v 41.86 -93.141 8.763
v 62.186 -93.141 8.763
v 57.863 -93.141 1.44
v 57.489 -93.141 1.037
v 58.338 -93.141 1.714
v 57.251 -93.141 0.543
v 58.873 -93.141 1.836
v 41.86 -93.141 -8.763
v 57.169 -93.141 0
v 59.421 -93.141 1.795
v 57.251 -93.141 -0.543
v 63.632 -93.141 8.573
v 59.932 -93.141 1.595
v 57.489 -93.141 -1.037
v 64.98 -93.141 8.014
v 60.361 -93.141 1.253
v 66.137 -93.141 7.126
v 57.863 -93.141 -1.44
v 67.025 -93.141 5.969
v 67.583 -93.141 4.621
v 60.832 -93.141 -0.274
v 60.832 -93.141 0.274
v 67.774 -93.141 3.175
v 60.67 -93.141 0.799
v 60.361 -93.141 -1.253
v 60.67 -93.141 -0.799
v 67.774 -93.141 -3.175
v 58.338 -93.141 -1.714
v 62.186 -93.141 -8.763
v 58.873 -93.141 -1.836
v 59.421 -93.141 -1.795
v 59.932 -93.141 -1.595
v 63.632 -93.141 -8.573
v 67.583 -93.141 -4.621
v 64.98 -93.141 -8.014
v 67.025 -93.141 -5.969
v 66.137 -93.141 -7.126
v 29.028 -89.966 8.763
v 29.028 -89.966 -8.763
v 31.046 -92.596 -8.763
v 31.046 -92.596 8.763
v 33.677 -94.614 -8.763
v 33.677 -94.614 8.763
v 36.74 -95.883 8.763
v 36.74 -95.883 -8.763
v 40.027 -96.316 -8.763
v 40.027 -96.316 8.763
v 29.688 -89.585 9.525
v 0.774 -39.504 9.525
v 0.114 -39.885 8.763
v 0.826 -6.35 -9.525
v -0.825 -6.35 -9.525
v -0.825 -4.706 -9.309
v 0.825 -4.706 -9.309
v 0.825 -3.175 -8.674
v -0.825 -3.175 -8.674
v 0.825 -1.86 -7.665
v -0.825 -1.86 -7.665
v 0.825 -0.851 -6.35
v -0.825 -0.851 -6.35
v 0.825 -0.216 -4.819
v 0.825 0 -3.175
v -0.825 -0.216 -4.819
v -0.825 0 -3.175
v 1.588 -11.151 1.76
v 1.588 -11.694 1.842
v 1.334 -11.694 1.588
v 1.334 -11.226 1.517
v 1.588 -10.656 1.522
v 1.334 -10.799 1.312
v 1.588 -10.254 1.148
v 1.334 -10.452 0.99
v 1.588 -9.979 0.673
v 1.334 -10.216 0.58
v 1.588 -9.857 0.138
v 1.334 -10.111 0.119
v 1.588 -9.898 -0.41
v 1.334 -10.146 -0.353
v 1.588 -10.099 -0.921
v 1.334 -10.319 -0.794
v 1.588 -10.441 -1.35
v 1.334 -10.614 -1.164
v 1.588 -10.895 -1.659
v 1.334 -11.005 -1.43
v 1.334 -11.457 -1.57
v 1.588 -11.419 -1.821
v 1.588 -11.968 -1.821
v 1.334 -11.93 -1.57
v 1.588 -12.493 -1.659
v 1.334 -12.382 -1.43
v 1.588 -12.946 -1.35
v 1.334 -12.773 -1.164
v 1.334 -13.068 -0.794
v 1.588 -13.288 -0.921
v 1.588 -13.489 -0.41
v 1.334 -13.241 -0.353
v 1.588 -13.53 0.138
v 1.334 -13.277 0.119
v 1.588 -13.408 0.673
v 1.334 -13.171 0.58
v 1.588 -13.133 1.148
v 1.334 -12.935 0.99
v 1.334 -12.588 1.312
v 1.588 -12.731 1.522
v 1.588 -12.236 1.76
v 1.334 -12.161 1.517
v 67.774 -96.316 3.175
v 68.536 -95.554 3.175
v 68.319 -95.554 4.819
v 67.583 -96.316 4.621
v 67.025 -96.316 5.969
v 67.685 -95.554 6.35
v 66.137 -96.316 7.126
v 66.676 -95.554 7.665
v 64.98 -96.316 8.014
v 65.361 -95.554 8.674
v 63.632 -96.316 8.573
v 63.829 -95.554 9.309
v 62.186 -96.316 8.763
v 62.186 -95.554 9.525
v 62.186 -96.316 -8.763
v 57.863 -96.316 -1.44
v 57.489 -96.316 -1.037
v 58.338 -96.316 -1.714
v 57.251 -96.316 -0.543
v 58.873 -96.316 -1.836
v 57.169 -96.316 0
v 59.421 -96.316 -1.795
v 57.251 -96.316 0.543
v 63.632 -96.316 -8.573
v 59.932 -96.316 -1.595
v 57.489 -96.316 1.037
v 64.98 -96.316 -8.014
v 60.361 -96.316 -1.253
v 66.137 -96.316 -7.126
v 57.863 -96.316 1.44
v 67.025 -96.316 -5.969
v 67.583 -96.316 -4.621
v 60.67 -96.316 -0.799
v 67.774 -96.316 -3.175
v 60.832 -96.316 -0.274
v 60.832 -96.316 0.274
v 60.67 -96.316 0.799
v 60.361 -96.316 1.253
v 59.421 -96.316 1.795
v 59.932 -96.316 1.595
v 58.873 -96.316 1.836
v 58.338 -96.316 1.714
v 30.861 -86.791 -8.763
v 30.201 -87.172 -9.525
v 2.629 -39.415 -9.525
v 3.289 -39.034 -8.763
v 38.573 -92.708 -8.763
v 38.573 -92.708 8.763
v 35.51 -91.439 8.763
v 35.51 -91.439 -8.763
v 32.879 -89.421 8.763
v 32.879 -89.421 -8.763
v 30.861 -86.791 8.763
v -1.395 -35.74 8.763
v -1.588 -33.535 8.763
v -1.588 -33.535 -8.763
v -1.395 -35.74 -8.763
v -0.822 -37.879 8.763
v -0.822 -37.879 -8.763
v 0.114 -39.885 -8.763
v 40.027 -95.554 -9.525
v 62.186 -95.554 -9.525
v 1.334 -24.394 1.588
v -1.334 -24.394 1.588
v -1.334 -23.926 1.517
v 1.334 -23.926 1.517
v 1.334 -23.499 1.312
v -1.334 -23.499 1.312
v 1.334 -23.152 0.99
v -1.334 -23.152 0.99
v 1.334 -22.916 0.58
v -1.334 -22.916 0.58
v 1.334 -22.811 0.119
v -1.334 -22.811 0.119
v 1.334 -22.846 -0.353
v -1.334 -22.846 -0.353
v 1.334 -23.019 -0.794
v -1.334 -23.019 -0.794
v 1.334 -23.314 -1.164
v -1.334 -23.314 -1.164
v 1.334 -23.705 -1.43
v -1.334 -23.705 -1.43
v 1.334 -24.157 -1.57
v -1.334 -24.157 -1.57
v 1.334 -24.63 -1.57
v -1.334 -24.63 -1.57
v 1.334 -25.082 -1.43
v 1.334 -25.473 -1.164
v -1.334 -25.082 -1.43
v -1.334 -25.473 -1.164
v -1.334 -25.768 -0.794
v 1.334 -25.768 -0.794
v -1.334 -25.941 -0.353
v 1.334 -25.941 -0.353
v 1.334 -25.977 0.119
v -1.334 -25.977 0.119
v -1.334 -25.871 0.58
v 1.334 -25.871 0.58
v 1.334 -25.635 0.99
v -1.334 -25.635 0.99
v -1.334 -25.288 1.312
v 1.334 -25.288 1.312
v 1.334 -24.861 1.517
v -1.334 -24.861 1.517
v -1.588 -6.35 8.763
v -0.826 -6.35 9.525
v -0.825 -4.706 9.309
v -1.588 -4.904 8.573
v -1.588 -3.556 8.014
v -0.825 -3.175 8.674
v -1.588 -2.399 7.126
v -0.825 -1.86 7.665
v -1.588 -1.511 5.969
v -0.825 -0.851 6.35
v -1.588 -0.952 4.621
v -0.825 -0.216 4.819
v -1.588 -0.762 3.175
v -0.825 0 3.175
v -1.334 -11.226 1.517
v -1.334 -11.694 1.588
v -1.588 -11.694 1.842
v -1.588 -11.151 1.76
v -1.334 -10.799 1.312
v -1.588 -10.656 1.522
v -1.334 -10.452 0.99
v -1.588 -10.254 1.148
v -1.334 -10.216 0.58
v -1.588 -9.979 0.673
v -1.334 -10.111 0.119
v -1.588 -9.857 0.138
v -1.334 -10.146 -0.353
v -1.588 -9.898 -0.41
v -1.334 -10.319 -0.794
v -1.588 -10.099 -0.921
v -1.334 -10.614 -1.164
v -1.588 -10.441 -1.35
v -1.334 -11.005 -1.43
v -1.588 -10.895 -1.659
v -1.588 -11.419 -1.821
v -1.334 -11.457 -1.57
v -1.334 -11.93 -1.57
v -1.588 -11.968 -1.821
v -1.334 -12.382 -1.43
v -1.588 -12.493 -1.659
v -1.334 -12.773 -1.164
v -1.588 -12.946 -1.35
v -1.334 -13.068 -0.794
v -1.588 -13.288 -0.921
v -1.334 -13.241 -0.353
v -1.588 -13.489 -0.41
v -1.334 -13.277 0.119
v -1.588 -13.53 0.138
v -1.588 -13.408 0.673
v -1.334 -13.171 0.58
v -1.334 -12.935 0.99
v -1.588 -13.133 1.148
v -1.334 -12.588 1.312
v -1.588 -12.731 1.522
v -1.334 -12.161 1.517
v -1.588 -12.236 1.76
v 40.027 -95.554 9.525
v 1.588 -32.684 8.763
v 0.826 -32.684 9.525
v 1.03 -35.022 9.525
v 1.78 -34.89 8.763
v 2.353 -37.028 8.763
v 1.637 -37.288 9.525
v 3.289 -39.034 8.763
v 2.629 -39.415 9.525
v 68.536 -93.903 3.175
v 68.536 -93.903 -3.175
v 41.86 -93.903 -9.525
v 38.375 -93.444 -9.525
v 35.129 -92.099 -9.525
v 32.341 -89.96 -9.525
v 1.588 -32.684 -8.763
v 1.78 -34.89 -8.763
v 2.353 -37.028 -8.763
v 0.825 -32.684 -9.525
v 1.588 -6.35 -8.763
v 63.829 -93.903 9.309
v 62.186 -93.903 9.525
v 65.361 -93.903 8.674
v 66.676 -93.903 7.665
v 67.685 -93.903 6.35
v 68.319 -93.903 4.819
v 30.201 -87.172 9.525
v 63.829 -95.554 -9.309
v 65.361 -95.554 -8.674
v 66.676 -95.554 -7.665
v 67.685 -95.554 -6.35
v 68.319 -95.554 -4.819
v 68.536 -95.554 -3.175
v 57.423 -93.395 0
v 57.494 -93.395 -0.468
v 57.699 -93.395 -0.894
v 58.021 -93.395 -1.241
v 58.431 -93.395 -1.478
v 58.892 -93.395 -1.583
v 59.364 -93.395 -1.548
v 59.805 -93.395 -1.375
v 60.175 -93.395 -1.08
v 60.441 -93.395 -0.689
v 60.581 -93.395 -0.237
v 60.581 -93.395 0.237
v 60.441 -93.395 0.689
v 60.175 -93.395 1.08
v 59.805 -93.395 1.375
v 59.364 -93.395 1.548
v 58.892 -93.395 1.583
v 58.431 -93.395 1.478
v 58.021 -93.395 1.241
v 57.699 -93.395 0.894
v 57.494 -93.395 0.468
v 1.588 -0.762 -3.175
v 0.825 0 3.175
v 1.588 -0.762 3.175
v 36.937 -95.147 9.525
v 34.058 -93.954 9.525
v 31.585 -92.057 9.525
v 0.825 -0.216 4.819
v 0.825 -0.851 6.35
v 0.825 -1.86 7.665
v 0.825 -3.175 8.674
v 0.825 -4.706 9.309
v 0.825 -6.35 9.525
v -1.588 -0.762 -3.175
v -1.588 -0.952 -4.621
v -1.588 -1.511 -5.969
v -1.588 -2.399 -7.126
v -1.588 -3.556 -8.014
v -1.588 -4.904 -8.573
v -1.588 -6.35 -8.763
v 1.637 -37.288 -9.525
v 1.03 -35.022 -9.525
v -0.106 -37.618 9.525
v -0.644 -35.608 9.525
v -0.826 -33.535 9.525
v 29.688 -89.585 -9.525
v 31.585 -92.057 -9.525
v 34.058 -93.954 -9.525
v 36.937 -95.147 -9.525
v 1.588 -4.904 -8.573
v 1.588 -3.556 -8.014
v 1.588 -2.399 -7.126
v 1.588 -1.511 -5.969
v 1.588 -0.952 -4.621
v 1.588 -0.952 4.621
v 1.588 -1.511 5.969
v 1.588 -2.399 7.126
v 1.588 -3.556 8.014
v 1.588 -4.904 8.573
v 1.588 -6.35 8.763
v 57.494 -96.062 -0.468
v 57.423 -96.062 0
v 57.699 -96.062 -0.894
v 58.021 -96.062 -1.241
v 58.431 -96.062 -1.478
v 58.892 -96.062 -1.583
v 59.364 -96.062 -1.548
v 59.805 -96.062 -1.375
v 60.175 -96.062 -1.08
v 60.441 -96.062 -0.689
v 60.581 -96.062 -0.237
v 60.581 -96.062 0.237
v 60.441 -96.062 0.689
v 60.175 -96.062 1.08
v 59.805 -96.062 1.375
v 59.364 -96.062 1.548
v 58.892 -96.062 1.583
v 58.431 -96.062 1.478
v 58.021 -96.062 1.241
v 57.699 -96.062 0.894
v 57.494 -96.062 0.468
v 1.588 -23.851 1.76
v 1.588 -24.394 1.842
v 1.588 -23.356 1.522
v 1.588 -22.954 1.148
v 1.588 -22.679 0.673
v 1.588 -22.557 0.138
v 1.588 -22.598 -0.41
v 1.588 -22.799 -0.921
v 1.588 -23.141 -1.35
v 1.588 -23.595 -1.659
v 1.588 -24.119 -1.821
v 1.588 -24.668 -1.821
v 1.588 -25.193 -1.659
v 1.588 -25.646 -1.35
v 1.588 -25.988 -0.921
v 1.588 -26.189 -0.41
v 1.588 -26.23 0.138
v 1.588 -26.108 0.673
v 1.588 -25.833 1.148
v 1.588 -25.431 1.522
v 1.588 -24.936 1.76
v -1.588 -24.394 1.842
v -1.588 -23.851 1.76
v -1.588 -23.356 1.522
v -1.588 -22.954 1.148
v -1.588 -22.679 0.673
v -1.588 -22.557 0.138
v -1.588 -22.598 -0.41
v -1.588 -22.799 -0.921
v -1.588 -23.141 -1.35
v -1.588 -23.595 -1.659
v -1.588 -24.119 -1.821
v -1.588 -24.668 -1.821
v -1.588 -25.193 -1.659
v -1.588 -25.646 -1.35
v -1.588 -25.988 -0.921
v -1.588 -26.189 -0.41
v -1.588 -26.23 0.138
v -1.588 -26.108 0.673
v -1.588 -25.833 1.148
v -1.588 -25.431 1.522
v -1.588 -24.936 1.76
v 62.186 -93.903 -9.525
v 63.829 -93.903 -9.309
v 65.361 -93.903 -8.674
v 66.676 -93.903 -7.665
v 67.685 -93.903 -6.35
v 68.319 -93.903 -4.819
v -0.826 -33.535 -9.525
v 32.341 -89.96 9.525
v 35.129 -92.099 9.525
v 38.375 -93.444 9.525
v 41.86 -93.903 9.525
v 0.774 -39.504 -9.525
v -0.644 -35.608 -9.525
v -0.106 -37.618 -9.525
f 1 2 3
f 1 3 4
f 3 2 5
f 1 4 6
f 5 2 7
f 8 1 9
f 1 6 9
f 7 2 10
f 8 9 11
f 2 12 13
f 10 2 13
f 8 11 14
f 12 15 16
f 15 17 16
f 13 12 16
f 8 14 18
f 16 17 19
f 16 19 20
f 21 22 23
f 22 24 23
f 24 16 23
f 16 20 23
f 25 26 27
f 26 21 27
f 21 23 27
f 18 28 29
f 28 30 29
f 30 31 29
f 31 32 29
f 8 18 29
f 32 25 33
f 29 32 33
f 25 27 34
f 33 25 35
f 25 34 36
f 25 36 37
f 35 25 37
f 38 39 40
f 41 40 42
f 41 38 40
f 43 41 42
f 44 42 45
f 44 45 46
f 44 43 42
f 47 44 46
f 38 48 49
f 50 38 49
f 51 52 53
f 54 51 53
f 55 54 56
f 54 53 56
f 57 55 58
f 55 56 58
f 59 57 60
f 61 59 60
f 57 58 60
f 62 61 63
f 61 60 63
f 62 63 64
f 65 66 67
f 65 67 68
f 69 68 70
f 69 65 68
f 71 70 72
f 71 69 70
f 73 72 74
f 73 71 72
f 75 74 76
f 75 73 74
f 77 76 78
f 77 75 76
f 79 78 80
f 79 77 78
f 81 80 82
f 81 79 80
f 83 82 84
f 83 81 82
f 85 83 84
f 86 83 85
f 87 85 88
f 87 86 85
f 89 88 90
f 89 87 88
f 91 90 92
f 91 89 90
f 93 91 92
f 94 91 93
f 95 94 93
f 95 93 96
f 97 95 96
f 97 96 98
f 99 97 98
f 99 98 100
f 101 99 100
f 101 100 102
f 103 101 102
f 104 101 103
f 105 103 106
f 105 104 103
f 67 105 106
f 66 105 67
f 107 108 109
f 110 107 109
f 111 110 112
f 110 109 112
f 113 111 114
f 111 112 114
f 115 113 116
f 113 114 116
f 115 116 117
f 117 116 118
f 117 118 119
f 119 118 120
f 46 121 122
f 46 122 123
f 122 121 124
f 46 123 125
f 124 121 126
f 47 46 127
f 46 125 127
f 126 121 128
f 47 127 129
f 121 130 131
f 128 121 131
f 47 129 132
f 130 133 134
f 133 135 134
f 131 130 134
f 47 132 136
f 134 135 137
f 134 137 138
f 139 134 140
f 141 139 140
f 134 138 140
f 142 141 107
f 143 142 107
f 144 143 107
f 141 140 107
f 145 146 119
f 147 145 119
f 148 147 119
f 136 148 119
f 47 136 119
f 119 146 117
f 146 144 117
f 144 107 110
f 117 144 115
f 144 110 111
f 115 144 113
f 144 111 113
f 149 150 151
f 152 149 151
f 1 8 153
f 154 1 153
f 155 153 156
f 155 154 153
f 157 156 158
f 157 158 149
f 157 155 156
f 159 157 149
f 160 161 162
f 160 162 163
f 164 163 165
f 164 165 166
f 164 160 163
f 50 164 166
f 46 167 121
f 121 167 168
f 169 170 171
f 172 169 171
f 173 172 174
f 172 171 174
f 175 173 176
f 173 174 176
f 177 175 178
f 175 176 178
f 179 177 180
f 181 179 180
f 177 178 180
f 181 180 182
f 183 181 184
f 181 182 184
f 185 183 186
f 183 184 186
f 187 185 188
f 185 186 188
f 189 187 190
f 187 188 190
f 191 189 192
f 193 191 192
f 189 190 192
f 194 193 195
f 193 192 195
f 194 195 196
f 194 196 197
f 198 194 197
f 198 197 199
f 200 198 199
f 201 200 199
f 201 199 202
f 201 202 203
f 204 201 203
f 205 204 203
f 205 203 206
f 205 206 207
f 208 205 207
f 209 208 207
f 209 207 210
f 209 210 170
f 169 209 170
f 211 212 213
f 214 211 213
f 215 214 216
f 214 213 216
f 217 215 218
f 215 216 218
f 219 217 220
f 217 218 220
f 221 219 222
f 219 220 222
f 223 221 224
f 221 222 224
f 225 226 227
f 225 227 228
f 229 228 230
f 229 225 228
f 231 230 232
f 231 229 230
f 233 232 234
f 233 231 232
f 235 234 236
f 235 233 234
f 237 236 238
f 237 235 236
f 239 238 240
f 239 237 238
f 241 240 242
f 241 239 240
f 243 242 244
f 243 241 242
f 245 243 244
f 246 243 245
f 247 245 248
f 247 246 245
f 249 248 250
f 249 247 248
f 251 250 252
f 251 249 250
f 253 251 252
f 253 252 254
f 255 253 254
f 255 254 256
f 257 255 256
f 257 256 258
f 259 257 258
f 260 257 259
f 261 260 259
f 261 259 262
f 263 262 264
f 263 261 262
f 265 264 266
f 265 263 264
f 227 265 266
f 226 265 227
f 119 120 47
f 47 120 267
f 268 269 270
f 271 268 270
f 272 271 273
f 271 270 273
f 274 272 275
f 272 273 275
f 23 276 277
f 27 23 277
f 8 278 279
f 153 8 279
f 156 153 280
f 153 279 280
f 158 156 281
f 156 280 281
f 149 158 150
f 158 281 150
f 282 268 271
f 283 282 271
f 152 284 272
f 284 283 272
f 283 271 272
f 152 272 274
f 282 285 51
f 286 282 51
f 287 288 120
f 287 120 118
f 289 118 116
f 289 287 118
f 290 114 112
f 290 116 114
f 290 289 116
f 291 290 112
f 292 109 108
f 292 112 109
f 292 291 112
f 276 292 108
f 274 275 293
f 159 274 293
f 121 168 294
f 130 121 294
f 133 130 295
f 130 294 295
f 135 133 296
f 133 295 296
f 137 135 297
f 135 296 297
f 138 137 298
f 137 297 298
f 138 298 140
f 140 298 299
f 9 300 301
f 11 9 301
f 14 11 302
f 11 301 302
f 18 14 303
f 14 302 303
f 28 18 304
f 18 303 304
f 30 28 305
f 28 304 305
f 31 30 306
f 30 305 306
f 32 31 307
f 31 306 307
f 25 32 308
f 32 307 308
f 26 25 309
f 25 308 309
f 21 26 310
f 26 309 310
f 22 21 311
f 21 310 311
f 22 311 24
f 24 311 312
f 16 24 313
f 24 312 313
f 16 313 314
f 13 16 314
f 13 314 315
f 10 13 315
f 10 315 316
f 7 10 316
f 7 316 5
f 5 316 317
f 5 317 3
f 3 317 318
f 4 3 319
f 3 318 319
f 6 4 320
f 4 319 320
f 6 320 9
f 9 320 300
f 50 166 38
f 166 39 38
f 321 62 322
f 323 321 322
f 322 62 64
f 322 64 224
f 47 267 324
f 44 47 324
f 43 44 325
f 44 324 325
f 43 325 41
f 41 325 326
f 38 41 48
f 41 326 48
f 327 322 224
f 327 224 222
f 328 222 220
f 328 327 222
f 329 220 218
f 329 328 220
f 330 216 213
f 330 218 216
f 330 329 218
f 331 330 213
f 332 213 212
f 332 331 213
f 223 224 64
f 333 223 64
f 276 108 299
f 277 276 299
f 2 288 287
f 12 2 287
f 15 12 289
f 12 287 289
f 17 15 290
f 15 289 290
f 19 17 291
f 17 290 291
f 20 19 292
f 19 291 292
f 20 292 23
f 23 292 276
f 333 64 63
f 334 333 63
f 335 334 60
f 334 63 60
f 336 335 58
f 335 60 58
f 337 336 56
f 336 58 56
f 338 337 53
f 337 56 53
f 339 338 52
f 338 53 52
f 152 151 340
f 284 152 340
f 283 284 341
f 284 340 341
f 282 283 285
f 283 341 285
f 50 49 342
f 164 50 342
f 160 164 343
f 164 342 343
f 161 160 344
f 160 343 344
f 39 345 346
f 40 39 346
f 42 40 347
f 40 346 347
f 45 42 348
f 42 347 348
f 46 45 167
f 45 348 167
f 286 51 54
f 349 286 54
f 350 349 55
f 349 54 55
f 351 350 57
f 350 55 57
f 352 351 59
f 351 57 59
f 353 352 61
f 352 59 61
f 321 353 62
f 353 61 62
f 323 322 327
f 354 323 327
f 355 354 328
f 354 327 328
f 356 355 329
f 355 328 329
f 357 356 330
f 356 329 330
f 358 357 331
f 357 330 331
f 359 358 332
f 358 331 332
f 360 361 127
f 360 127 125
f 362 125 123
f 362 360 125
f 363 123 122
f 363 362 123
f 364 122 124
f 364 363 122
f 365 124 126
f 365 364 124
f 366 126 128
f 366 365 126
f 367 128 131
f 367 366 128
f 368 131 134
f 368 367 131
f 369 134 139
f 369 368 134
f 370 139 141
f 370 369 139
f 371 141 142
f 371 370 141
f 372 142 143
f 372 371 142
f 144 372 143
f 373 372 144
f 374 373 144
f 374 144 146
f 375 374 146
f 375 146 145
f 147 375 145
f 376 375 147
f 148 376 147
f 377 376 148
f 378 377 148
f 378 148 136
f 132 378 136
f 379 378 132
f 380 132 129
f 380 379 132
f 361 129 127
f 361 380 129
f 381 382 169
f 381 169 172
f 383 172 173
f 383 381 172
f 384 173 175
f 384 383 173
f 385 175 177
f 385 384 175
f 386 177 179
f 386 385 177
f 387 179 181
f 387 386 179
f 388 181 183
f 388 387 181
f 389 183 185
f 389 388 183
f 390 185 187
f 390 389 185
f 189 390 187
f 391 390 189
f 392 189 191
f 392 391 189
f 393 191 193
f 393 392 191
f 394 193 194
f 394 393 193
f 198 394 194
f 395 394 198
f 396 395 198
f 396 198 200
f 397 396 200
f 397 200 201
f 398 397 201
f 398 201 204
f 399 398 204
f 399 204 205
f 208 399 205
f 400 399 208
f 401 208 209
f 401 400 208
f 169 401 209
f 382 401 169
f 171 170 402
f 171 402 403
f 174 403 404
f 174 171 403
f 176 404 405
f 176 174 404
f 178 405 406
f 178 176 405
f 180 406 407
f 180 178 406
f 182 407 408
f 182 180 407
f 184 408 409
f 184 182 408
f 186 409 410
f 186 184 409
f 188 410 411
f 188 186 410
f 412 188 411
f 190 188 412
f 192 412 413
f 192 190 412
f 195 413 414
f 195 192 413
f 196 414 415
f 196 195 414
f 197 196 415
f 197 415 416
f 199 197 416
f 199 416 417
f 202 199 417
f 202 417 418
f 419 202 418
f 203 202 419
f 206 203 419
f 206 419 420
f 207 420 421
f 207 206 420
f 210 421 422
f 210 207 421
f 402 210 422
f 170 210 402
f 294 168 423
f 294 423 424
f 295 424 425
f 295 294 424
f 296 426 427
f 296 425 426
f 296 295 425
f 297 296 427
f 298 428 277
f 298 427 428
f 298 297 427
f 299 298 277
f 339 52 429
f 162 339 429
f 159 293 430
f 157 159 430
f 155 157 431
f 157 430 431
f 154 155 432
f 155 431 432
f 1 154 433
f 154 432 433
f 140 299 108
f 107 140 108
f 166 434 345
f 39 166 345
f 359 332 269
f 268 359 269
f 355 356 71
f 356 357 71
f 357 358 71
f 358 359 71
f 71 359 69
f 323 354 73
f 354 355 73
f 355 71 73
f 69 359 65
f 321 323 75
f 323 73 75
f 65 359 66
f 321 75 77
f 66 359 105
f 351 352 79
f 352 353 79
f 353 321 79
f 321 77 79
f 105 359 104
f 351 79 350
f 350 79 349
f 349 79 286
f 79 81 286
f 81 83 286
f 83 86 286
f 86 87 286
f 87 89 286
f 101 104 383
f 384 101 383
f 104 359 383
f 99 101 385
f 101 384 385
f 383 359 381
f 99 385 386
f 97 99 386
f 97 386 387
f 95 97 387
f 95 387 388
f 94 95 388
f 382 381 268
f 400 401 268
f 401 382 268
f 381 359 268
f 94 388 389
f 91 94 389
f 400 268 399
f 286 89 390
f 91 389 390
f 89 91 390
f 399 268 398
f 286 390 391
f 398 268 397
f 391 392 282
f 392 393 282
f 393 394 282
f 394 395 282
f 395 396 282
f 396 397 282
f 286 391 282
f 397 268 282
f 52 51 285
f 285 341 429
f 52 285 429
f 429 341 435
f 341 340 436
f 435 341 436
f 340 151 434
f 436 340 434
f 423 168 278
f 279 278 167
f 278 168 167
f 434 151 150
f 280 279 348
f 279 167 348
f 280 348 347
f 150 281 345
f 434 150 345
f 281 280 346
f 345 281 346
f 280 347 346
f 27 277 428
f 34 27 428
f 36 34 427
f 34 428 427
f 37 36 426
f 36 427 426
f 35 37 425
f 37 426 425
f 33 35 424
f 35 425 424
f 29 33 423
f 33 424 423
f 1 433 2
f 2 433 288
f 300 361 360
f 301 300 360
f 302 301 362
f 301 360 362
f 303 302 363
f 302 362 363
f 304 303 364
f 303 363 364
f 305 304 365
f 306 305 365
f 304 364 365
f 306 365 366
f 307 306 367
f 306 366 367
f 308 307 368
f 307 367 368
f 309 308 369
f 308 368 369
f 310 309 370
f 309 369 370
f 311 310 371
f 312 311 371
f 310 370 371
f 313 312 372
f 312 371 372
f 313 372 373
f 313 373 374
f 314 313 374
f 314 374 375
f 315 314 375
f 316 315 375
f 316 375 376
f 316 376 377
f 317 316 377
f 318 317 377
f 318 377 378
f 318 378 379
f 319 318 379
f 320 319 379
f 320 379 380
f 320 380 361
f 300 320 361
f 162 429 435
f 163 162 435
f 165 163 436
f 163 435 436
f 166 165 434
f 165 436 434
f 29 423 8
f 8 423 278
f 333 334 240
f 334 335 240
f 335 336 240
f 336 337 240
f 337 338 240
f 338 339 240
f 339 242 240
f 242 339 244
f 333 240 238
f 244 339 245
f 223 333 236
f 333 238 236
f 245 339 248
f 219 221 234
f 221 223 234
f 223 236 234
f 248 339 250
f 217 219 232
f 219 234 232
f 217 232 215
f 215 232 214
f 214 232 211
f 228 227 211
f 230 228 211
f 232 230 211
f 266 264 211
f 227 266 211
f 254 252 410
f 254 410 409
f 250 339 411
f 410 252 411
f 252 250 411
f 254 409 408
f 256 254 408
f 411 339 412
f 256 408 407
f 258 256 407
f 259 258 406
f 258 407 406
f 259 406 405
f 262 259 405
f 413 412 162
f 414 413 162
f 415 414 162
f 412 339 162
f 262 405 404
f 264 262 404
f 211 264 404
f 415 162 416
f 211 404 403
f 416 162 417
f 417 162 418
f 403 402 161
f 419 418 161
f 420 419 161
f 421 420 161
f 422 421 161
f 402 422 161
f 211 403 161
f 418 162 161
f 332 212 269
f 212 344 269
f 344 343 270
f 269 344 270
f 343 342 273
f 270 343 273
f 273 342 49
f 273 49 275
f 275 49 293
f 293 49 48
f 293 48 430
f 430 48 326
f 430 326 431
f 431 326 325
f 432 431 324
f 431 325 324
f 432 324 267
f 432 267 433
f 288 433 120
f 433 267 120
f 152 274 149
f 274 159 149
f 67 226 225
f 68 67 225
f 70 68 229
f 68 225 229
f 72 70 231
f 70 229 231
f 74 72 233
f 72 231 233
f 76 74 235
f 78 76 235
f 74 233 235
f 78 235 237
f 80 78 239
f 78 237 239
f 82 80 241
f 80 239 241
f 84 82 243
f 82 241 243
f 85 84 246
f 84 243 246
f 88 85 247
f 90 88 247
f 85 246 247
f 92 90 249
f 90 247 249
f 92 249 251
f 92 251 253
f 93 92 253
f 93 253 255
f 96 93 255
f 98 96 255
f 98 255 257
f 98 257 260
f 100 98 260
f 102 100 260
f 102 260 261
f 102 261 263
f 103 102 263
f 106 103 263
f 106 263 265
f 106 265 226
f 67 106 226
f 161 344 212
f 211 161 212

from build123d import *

# Parameters (mm, degrees)
SKETCH2_W                    = 3.175
SKETCH2_H                    = 19.05
F_1_8_0_125_DIAMETER_HOLE1_D = 3.175
F_1_8_0_125_DIAMETER_HOLE2_D = 3.175
FILLET1_R                    = 12.7
FILLET2_R                    = 6.35
CHAMFER3_SIZE                = 0.762
CHAMFER2_SIZE                = 0.254


with BuildPart() as part:
    # Sweep1: sweep along a path in Sketch1
    with BuildLine(Plane.XY) as sweep1_path:
        Line((0, 0), (0, -36.5125))
        Line((0, -36.5125), (33.61082832, -94.728162334))
        Line((33.61082832, -94.728162334), (68.53582832, -94.728162334))
    # Sketch2 → Sweep1 (sweep)
    with BuildSketch(Plane(origin=(0, 0, 0), x_dir=(1, 0, 0), z_dir=(0, 1, 0))):
        Rectangle(SKETCH2_W, SKETCH2_H)
    sweep(path=sweep1_path.line, transition=Transition.RIGHT)

    # 1/8 (0.125) Diameter Hole1 (through all)
    with Locations(Plane(origin=(1.5875, 0, 0), x_dir=(0, 0, -1), z_dir=(1, 0, 0))):
        with Locations((0, -11.693565329), (0, -24.393565329)):
            Hole(F_1_8_0_125_DIAMETER_HOLE1_D / 2)

    # 1/8 (0.125) Diameter Hole2 (through all)
    with Locations(Plane(origin=(0, -93.140662334, 0), x_dir=(1, 0, 0), z_dir=(0, 1, 0))):
        with Locations((59.01082832, 0)):
            Hole(F_1_8_0_125_DIAMETER_HOLE2_D / 2)

    # Fillet1
    fillet1_edges = [part.edges().sort_by_distance(p)[0] for p in [
        (1.5875, -36.087130657, 0),
        (-1.5875, -36.937869343, 0),
        (32.694284767, -96.315662334, 0),
        (34.527371872, -93.140662334, 0),
    ]]
    fillet(fillet1_edges, radius=FILLET1_R)

    # Fillet2
    fillet2_edges = [part.edges().sort_by_distance(p)[0] for p in [
        (0, 0, -9.525),
        (0, 0, 9.525),
        (68.53582832, -94.728162334, -9.525),
        (68.53582832, -94.728162334, 9.525),
    ]]
    fillet(fillet2_edges, radius=FILLET2_R)

    # Chamfer3
    chamfer3_edges = [part.edges().sort_by_distance(p)[0] for p in [
        (68.53582832, -96.315662334, 0),
        (66.67595638, -96.315662334, 7.665128061),
        (66.67595638, -96.315662334, -7.665128061),
        (68.53582832, -93.140662334, 0),
        (66.67595638, -93.140662334, 7.665128061),
        (66.67595638, -93.140662334, -7.665128061),
        (1.5875, 0, 0),
        (-1.5875, 0, 0),
        (-1.5875, -19.9424573, -9.525),
        (-1.5875, -19.9424573, 9.525),
        (-1.5875, -1.859871939, 7.665128061),
        (-1.5875, -1.859871939, -7.665128061),
        (1.5875, -19.517087957, -9.525),
        (1.5875, -19.517087957, 9.525),
        (1.5875, -1.859871939, 7.665128061),
        (1.5875, -1.859871939, -7.665128061),
        (51.106230753, -96.315662334, -9.525),
        (51.106230753, -96.315662334, 9.525),
        (52.022774305, -93.140662334, -9.525),
        (33.676633186, -94.614184962, -9.525),
        (14.571043965, -64.925288467, -9.525),
        (17.075087517, -62.912419124, -9.525),
        (-1.154757994, -36.821916472, -9.525),
        (33.676633186, -94.614184962, -9.525),
        (14.571043965, -64.925288467, 9.525),
        (17.075087517, -62.912419124, 9.525),
        (-1.154757994, -36.821916472, 9.525),
        (33.676633186, -94.614184962, 9.525),
        (52.022774305, -93.140662334, 9.525),
        (33.676633186, -94.614184962, 9.525),
        (-1.154757994, -36.821916472, -9.525),
        (-1.154757994, -36.821916472, 9.525),
        (35.509720291, -91.439184962, 9.525),
        (35.509720291, -91.439184962, 9.525),
        (35.509720291, -91.439184962, -9.525),
        (35.509720291, -91.439184962, -9.525),
        (2.020242006, -35.971177786, 9.525),
        (2.020242006, -35.971177786, 9.525),
        (2.020242006, -35.971177786, -9.525),
        (2.020242006, -35.971177786, -9.525),
    ]]
    chamfer(chamfer3_edges, length=CHAMFER3_SIZE)

    # Chamfer2
    chamfer2_edges = [part.edges().sort_by_distance(p)[0] for p in [
        (1.5875, -24.393565329, -1.5875),
        (-1.5875, -24.393565329, -1.5875),
        (1.5875, -11.693565329, -1.5875),
        (-1.5875, -11.693565329, -1.5875),
        (60.59832832, -93.140662334, 0),
        (60.59832832, -96.315662334, 0),
    ]]
    chamfer(chamfer2_edges, length=CHAMFER2_SIZE)


solid = part.part
